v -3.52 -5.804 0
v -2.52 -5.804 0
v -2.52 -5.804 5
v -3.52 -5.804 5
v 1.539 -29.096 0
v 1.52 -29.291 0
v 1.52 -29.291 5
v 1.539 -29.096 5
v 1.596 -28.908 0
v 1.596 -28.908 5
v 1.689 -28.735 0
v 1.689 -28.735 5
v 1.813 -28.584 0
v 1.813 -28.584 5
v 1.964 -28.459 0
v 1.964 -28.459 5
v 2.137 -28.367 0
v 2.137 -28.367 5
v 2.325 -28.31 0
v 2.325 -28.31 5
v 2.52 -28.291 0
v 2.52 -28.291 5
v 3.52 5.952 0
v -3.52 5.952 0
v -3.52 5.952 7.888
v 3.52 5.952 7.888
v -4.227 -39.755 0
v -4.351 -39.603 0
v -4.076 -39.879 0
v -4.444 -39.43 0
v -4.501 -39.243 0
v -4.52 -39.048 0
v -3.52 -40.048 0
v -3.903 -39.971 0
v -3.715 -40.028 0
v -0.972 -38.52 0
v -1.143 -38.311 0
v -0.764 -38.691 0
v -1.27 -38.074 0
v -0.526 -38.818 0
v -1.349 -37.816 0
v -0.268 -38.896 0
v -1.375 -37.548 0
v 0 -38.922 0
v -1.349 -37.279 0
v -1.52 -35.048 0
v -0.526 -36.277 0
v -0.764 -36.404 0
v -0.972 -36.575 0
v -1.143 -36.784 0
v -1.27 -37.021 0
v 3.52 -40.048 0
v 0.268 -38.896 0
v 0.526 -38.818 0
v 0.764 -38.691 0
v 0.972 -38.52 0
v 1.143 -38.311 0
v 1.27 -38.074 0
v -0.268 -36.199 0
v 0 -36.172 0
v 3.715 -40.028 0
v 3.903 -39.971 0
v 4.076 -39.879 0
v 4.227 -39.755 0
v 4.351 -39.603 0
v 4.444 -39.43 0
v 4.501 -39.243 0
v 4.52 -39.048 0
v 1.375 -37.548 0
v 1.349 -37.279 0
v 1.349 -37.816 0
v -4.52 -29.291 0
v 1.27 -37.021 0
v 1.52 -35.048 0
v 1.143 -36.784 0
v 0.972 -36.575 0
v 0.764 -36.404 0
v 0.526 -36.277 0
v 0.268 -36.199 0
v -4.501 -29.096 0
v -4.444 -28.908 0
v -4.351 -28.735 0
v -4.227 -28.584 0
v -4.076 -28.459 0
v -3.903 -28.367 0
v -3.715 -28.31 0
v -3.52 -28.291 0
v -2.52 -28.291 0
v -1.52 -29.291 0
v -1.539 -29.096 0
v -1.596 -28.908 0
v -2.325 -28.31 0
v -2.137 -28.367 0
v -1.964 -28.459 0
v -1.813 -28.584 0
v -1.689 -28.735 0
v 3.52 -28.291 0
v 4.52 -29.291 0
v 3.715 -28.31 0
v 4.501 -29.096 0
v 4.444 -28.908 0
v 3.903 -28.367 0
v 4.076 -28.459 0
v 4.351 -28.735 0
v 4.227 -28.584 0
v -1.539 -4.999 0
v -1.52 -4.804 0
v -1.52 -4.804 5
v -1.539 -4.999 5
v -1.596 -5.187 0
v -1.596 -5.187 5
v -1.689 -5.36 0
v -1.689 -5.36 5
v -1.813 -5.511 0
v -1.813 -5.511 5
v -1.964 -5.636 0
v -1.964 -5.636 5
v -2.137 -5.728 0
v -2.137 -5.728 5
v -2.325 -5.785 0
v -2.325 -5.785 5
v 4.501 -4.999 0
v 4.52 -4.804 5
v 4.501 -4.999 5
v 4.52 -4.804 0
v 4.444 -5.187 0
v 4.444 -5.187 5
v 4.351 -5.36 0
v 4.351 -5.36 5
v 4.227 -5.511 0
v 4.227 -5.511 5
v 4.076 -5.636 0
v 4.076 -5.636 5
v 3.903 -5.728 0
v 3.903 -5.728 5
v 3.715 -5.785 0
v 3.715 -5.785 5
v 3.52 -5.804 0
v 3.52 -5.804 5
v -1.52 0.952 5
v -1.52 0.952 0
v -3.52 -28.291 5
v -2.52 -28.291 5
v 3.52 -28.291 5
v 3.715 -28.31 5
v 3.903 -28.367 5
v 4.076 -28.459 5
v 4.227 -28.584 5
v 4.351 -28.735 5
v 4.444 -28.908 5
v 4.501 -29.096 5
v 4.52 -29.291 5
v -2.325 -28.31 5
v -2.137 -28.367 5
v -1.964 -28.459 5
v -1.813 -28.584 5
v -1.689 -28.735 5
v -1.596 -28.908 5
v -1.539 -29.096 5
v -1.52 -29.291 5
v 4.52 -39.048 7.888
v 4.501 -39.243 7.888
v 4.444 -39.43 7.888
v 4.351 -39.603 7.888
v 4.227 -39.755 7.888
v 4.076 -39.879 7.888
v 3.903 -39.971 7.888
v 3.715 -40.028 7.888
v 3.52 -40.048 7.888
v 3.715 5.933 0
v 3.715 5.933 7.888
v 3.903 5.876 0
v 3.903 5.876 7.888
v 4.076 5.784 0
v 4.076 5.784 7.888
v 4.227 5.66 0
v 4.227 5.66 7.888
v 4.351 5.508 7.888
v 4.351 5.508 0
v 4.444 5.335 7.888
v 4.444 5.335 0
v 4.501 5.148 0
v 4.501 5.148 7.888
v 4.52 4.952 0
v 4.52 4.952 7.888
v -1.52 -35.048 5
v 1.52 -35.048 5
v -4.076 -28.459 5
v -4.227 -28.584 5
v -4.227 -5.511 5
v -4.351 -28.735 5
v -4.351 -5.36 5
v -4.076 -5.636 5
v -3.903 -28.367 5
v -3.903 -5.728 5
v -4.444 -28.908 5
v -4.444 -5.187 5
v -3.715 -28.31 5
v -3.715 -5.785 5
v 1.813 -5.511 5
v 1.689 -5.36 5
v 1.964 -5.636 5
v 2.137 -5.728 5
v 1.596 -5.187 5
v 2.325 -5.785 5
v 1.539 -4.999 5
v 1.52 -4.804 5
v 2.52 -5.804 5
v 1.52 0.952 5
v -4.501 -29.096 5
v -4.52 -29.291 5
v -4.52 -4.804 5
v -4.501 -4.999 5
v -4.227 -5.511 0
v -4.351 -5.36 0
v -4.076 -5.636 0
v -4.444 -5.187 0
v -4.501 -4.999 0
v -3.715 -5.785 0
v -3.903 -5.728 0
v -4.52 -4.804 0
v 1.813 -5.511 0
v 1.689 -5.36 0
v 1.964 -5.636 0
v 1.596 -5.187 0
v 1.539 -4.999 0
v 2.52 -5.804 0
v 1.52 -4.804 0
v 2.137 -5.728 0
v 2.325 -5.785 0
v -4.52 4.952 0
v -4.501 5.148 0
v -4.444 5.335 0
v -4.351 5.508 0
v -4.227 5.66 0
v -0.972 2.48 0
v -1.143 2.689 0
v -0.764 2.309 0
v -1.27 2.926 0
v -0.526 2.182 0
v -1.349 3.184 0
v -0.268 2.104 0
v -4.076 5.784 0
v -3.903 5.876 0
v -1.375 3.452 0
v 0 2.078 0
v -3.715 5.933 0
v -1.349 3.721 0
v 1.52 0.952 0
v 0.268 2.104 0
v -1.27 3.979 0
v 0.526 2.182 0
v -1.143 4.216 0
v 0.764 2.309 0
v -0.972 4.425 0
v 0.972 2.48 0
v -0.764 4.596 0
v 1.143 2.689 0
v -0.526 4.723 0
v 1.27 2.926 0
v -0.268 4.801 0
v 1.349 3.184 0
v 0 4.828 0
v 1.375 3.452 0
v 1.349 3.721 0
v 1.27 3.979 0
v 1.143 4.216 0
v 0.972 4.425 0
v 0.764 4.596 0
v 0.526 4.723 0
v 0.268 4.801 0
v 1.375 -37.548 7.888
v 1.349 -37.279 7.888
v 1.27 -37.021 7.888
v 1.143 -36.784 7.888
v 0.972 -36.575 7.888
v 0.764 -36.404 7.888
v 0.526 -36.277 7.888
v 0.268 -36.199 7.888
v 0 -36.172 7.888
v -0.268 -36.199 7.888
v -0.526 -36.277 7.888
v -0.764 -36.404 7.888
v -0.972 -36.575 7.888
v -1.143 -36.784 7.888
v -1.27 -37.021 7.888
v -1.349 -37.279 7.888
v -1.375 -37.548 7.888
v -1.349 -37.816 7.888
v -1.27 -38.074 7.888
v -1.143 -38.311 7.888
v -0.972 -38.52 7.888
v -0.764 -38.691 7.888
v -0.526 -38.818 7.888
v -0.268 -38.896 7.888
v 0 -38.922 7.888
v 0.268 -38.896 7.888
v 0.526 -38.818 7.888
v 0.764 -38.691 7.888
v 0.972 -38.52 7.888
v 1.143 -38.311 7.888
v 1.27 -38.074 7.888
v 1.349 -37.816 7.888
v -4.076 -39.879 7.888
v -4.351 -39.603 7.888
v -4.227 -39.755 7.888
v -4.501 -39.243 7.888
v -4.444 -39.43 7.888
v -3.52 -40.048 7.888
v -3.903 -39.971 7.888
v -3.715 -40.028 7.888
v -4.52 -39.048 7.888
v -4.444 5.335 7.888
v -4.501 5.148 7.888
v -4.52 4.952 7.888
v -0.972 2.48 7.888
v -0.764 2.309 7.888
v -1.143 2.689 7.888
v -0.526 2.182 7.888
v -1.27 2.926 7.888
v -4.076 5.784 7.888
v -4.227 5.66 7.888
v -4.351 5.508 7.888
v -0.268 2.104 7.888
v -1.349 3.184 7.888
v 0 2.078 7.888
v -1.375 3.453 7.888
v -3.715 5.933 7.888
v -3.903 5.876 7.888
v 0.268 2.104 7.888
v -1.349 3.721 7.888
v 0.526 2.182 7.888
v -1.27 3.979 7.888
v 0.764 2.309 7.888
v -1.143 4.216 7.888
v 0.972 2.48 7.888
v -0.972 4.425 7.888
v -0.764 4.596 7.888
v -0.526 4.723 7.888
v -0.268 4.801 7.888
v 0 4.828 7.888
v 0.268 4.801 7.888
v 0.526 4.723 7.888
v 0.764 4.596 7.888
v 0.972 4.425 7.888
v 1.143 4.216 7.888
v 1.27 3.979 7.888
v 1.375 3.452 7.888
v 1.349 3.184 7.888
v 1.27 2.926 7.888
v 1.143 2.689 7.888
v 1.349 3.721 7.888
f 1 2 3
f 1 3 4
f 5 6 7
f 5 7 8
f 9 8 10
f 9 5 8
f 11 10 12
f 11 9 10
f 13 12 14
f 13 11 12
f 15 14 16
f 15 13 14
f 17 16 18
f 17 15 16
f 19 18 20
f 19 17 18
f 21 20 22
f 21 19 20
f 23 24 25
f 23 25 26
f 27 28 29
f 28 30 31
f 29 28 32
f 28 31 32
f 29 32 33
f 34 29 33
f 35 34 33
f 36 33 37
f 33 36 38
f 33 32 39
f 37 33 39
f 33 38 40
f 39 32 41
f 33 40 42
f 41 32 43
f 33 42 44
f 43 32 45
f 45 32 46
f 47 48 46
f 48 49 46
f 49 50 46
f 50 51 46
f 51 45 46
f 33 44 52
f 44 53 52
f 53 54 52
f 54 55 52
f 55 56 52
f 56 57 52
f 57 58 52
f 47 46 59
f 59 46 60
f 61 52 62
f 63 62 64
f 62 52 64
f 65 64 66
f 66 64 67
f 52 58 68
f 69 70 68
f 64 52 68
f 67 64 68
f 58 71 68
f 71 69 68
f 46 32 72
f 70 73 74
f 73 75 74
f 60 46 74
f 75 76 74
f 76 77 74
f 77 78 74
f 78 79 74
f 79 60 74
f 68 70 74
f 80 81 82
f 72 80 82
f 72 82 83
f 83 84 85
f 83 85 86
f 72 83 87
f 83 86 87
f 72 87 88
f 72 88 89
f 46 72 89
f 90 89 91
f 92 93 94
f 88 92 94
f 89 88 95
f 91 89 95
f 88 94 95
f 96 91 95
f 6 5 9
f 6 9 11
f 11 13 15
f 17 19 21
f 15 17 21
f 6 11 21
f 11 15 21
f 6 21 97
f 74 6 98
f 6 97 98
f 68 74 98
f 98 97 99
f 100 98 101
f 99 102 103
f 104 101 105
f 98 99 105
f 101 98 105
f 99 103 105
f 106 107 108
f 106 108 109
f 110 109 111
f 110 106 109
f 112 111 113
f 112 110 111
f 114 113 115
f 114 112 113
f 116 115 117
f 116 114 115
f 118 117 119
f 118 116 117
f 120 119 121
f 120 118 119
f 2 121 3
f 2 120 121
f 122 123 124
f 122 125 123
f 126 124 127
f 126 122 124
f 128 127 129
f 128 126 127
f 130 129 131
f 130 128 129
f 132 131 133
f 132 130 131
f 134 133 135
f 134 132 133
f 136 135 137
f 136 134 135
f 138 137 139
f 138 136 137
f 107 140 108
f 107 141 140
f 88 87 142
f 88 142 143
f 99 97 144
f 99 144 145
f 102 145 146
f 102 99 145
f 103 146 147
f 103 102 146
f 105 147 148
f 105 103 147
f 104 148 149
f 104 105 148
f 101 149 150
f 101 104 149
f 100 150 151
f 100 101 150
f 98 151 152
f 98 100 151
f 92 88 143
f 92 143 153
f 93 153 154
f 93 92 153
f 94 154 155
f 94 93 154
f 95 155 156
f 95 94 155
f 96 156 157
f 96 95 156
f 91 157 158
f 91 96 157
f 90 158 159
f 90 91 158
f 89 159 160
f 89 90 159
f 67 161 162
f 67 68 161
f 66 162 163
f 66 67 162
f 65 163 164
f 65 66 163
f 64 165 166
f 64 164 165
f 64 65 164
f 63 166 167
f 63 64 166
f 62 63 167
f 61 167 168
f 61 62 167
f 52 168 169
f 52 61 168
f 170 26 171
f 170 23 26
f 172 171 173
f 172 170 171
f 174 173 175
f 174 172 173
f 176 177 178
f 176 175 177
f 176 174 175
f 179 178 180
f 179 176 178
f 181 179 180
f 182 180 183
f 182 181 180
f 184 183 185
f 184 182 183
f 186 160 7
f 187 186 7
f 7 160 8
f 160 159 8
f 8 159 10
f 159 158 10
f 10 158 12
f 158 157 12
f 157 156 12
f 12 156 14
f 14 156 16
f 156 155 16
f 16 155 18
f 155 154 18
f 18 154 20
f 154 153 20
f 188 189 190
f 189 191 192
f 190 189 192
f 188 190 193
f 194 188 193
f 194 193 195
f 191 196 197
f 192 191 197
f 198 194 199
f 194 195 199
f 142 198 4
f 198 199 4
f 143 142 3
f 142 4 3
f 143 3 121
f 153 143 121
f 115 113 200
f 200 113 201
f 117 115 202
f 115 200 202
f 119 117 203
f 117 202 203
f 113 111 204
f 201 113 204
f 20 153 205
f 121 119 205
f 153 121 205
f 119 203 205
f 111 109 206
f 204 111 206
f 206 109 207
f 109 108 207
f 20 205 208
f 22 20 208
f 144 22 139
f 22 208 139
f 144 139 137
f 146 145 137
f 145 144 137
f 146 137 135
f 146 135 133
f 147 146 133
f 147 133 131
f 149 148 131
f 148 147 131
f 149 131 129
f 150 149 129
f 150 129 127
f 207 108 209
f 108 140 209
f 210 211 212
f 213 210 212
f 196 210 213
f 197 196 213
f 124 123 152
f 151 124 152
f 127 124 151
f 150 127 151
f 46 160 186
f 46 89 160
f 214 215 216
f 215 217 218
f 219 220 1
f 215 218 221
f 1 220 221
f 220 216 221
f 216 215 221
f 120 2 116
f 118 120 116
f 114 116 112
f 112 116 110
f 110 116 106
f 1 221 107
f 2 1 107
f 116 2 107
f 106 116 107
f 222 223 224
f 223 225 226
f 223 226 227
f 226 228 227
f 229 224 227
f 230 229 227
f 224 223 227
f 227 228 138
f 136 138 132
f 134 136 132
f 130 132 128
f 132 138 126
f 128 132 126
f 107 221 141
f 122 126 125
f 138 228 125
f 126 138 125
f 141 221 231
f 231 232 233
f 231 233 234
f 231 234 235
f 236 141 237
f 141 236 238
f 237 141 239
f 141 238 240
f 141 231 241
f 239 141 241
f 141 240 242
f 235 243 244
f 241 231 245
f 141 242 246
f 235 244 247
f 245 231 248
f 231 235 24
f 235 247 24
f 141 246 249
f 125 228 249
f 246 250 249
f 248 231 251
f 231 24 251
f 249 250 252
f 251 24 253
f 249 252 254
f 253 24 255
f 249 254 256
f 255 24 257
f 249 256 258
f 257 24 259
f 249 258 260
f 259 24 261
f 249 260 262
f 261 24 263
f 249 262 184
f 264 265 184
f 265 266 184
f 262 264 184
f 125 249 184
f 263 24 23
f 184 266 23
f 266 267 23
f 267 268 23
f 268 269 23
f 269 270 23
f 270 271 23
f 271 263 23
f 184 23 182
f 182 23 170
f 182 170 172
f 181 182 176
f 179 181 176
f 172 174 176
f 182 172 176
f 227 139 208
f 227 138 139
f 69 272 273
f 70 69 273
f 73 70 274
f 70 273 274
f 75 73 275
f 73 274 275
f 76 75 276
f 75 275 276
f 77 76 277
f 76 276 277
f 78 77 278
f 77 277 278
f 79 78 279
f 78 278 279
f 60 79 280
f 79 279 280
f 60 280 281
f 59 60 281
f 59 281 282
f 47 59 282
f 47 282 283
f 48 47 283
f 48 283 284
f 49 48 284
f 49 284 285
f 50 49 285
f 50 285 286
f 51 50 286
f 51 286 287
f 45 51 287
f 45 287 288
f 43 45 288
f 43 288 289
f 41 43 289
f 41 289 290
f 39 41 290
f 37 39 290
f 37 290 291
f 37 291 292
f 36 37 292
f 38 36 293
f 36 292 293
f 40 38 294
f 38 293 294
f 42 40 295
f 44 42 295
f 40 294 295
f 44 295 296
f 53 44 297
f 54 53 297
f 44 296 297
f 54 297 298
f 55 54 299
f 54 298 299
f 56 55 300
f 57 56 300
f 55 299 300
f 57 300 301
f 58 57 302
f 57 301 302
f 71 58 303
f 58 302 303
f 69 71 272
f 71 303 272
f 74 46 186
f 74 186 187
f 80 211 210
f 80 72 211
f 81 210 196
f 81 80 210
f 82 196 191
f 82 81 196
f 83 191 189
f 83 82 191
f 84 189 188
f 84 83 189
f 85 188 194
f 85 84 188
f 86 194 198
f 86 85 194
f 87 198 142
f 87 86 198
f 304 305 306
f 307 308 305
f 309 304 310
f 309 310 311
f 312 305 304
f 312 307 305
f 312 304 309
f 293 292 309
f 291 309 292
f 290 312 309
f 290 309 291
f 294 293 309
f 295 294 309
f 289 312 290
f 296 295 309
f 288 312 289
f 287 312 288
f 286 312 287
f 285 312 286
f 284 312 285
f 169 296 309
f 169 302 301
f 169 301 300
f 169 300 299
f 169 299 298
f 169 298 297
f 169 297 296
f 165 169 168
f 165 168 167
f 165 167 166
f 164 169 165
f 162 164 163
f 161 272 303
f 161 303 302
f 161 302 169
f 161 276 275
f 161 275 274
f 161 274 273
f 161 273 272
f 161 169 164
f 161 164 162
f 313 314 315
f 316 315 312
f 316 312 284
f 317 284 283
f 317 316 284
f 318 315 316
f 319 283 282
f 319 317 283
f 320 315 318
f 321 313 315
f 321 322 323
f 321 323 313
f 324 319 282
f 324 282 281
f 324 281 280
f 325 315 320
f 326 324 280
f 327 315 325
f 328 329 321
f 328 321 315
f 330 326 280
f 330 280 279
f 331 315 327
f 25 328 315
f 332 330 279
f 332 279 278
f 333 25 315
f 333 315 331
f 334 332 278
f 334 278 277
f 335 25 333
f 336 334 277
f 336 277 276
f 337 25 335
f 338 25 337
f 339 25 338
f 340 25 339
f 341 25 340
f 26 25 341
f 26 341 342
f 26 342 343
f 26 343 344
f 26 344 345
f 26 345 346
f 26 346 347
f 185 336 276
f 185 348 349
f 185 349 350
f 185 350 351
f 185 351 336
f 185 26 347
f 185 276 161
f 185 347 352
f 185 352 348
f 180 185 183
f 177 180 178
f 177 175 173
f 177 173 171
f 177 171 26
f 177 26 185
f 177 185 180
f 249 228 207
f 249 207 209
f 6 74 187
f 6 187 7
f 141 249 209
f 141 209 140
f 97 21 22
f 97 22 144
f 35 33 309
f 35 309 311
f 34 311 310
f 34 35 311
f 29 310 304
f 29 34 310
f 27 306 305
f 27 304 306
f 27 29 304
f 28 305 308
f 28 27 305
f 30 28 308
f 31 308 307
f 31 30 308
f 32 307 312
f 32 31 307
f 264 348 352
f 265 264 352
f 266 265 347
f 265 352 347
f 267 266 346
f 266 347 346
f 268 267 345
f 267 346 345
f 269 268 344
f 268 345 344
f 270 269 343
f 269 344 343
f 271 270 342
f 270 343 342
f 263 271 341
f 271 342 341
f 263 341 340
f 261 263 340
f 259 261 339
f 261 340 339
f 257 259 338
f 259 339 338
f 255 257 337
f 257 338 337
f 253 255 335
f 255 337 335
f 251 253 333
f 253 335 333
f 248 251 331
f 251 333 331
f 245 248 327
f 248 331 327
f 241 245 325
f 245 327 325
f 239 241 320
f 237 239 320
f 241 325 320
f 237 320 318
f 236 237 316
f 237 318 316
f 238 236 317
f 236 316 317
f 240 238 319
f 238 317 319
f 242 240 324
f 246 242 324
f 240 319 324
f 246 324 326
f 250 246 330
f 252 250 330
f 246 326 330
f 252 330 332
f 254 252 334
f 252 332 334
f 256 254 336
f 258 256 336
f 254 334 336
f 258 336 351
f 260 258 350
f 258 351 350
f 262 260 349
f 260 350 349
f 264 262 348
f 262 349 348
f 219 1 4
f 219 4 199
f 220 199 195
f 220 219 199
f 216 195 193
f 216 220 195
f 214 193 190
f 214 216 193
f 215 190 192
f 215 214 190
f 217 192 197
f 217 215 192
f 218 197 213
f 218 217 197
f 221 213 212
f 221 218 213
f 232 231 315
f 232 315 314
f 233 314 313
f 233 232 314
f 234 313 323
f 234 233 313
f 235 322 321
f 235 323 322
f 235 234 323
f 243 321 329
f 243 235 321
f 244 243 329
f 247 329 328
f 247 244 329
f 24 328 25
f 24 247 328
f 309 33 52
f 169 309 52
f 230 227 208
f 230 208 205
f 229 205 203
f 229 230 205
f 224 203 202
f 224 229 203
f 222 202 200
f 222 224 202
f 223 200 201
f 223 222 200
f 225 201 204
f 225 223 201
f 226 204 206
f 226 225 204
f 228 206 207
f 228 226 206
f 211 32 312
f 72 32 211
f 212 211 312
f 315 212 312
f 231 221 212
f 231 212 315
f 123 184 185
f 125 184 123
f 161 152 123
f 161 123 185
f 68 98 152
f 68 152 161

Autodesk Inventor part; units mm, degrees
ref_plane "YZ Plane" through (0, 0, 0) normal (1, 0, 0) x (0, 1, 0)
ref_plane "XZ Plane" through (0, 0, 0) normal (0, 1, 0) x (-1, 0, 0)
sketch "Sketch1" plane through (0, 0, 0) normal (0, 0, 1) x (1, 0, 0)
  arc A0 (-3.52, 5.9525) -> (-4.52, 4.9525) centre (-3.52, 4.9525) ccw projected
  line L0 (-4.52, -4.8041) -> (-4.52, 4.9525) projected
  arc A1 (-4.52, -4.8041) -> (-3.52, -5.8041) centre (-3.52, -4.8041) ccw projected
  line L1 (-2.52, -5.8041) -> (-3.52, -5.8041) projected
  arc A2 (-2.52, -5.8041) -> (-1.52, -4.8041) centre (-2.52, -4.8041) ccw projected
  line L2 (-1.52, 0.9525) -> (-1.52, -4.8041) projected
  line L3 (1.52, 0.9525) -> (-1.52, 0.9525) projected
  line L4 (1.52, -4.8041) -> (1.52, 0.9525) projected
  arc A3 (1.52, -4.8041) -> (2.52, -5.8041) centre (2.52, -4.8041) ccw projected
  line L5 (3.52, -5.8041) -> (2.52, -5.8041) projected
  arc A4 (3.52, -5.8041) -> (4.52, -4.8041) centre (3.52, -4.8041) ccw projected
  line L6 (4.52, 4.9525) -> (4.52, -4.8041) projected
  arc A5 (4.52, 4.9525) -> (3.52, 5.9525) centre (3.52, 4.9525) ccw projected
  line L7 (-3.52, 5.9525) -> (3.52, 5.9525) projected
  arc A6 (2.52, -28.2909) -> (1.52, -29.2909) centre (2.52, -29.2909) ccw projected
  line L8 (1.52, -35.0475) -> (1.52, -29.2909) projected
  line L9 (-1.52, -35.0475) -> (1.52, -35.0475) projected
  line L10 (-1.52, -29.2909) -> (-1.52, -35.0475) projected
  arc A7 (-1.52, -29.2909) -> (-2.52, -28.2909) centre (-2.52, -29.2909) ccw projected
  line L11 (-3.52, -28.2909) -> (-2.52, -28.2909) projected
  arc A8 (-3.52, -28.2909) -> (-4.52, -29.2909) centre (-3.52, -29.2909) ccw projected
  line L12 (-4.52, -39.0475) -> (-4.52, -29.2909) projected
  arc A9 (-4.52, -39.0475) -> (-3.52, -40.0475) centre (-3.52, -39.0475) ccw projected
  line L13 (3.52, -40.0475) -> (-3.52, -40.0475) projected
  arc A10 (3.52, -40.0475) -> (4.52, -39.0475) centre (3.52, -39.0475) ccw projected
  line L14 (4.52, -29.2909) -> (4.52, -39.0475) projected
  arc A11 (4.52, -29.2909) -> (3.52, -28.2909) centre (3.52, -29.2909) ccw projected
  line L15 (2.52, -28.2909) -> (3.52, -28.2909) projected
  point P0 (0, 0)
extrude "Extrusion1" add sketch "Sketch1" along normal blind 5
sketch "Sketch2" plane through (0, 0, 5) normal (0, 0, 1) x (1, 0, 0)
  arc A0 (-3.52, 5.9525) -> (-4.52, 4.9525) centre (-3.52, 4.9525) ccw projected
  line L0 (-4.52, 4.9525) -> (-4.52, -4.8041) projected
  arc A1 (-4.52, -4.8041) -> (-3.52, -5.8041) centre (-3.52, -4.8041) ccw projected
  line L1 (-3.52, -5.8041) -> (-2.52, -5.8041) projected
  arc A2 (-2.52, -5.8041) -> (-1.52, -4.8041) centre (-2.52, -4.8041) ccw projected
  line L2 (-1.52, -4.8041) -> (-1.52, 0.9525) projected
  line L3 (-1.52, 0.9525) -> (1.52, 0.9525) projected
  line L4 (1.52, 0.9525) -> (1.52, -4.8041) projected
  arc A3 (1.52, -4.8041) -> (2.52, -5.8041) centre (2.52, -4.8041) ccw projected
  line L5 (2.52, -5.8041) -> (3.52, -5.8041) projected
  arc A4 (3.52, -5.8041) -> (4.52, -4.8041) centre (3.52, -4.8041) ccw projected
  line L6 (4.52, -4.8041) -> (4.52, 4.9525) projected
  arc A5 (4.52, 4.9525) -> (3.52, 5.9525) centre (3.52, 4.9525) ccw projected
  line L7 (3.52, 5.9525) -> (-3.52, 5.9525) projected
  arc A6 (2.52, -28.2909) -> (1.52, -29.2909) centre (2.52, -29.2909) ccw projected
  line L8 (1.52, -29.2909) -> (1.52, -35.0475) projected
  line L9 (1.52, -35.0475) -> (-1.52, -35.0475) projected
  line L10 (-1.52, -35.0475) -> (-1.52, -29.2909) projected
  arc A7 (-1.52, -29.2909) -> (-2.52, -28.2909) centre (-2.52, -29.2909) ccw projected
  line L11 (-2.52, -28.2909) -> (-3.52, -28.2909) projected
  arc A8 (-3.52, -28.2909) -> (-4.52, -29.2909) centre (-3.52, -29.2909) ccw projected
  line L12 (-4.52, -29.2909) -> (-4.52, -39.0475) projected
  arc A9 (-4.52, -39.0475) -> (-3.52, -40.0475) centre (-3.52, -39.0475) ccw projected
  line L13 (-3.52, -40.0475) -> (3.52, -40.0475) projected
  arc A10 (3.52, -40.0475) -> (4.52, -39.0475) centre (3.52, -39.0475) ccw projected
  line L14 (4.52, -39.0475) -> (4.52, -29.2909) projected
  arc A11 (4.52, -29.2909) -> (3.52, -28.2909) centre (3.52, -29.2909) ccw projected
  line L15 (3.52, -28.2909) -> (2.52, -28.2909) projected
  line L16 (-4.52, -4.8041) -> (4.52, -4.8041)
  line L17 (4.52, -4.8041) -> (4.52, -29.2909)
  line L18 (4.52, -29.2909) -> (-4.52, -29.2909)
  line L19 (-4.52, -29.2909) -> (-4.52, -4.8041)
  line L20 (-1.52, -35.0475) -> (1.52, -35.0475)
  line L21 (1.52, -35.0475) -> (1.52, 0.9525)
  line L22 (1.52, 0.9525) -> (-1.52, 0.9525)
  line L23 (-1.52, 0.9525) -> (-1.52, -35.0475)
  point P0 (0, 0)
ref_plane "Work Plane1" through (-13.8343, -45.838, 7.888) normal (0, 0, -1) x (0, 1, 0)
extrude "Extrusion2" add sketch "Sketch2" along normal up to surface (2.888 mm away)
sketch "Sketch3" plane through (-3.52, 5.9525, 7.888) normal (0, 0, 1) x (1, 0, 0)
  arc A0 (6.04, -34.2434) -> (5.04, -35.2434) centre (6.04, -35.2434) ccw projected
  line L0 (5.04, -41) -> (5.04, -35.2434) projected
  line L1 (2, -41) -> (5.04, -41) projected
  line L2 (2, -35.2434) -> (2, -41) projected
  arc A1 (2, -35.2434) -> (1, -34.2434) centre (1, -35.2434) ccw projected
  line L3 (0, -34.2434) -> (1, -34.2434) projected
  arc A2 (0, -34.2434) -> (-1, -35.2434) centre (0, -35.2434) ccw projected
  line L4 (-1, -45) -> (-1, -35.2434) projected
  arc A3 (-1, -45) -> (0, -46) centre (0, -45) ccw projected
  line L5 (7.04, -46) -> (0, -46) projected
  arc A4 (7.04, -46) -> (8.04, -45) centre (7.04, -45) ccw projected
  line L6 (8.04, -35.2434) -> (8.04, -45) projected
  arc A5 (8.04, -35.2434) -> (7.04, -34.2434) centre (7.04, -35.2434) ccw projected
  line L7 (6.04, -34.2434) -> (7.04, -34.2434) projected
  arc A6 (0, 0) -> (-1, -1) centre (0, -1) ccw projected
  line L8 (-1, -10.7566) -> (-1, -1) projected
  arc A7 (-1, -10.7566) -> (0, -11.7566) centre (0, -10.7566) ccw projected
  line L9 (1, -11.7566) -> (0, -11.7566) projected
  arc A8 (1, -11.7566) -> (2, -10.7566) centre (1, -10.7566) ccw projected
  line L10 (2, -5) -> (2, -10.7566) projected
  line L11 (5.04, -5) -> (2, -5) projected
  line L12 (5.04, -10.7566) -> (5.04, -5) projected
  arc A9 (5.04, -10.7566) -> (6.04, -11.7566) centre (6.04, -10.7566) ccw projected
  line L13 (7.04, -11.7566) -> (6.04, -11.7566) projected
  arc A10 (7.04, -11.7566) -> (8.04, -10.7566) centre (7.04, -10.7566) ccw projected
  line L14 (8.04, -1) -> (8.04, -10.7566) projected
  arc A11 (8.04, -1) -> (7.04, 0) centre (7.04, -1) ccw projected
  line L15 (0, 0) -> (7.04, 0) projected
  line L16 (0, -46) -> (7.04, -46) projected
  line L17 (3.52, -46) -> (3.52, -41)
  line L18 (2, -41) -> (5.04, -41) projected
  circle A12 centre (3.52, -43.5) radius 1.375
  circle A13 centre (3.52, -43.5) radius 1.375
  line L19 (-1, -1) -> (-1, -45) projected
  line L20 (-1, -23) -> (-5.6453, -23)
  arc A14 (5.04, -10.7566) -> (6.04, -11.7566) centre (6.04, -10.7566) ccw
  line L21 (5.04, -5) -> (5.04, -10.7566)
  line L22 (2, -5) -> (5.04, -5)
  line L23 (2, -10.7566) -> (2, -5)
  arc A15 (1, -11.7566) -> (2, -10.7566) centre (1, -10.7566) ccw
  line L24 (0, -11.7566) -> (1, -11.7566)
  arc A16 (-1, -10.7566) -> (0, -11.7566) centre (0, -10.7566) ccw
  line L25 (-1, -1) -> (-1, -10.7566)
  arc A17 (0, 0) -> (-1, -1) centre (0, -1) ccw
  line L26 (7.04, 0) -> (0, 0)
  arc A18 (8.04, -1) -> (7.04, 0) centre (7.04, -1) ccw
  line L27 (8.04, -10.7566) -> (8.04, -1)
  arc A19 (7.04, -11.7566) -> (8.04, -10.7566) centre (7.04, -10.7566) ccw
  line L28 (6.04, -11.7566) -> (7.04, -11.7566)
  line L29 (0, 0) -> (7.04, 0)
  line L30 (3.52, 0) -> (3.52, -5)
  line L31 (2, -5) -> (5.04, -5)
  circle A20 centre (3.52, -2.5) radius 1.375
  circle A21 centre (3.52, -2.5) radius 1.375
  line L32 (-1, -45) -> (-1, -1)
  point P0 (3.52, -5.9525)
  dimension "d5" = 2.75
  dimension "d6" = 2.75
extrude "Extrusion3" cut sketch "Sketch3" against normal blind 100 contours A12 L17 | L17 A12 | A20 L30 | L30 A20
properties part number "SyringeServoClamp"
